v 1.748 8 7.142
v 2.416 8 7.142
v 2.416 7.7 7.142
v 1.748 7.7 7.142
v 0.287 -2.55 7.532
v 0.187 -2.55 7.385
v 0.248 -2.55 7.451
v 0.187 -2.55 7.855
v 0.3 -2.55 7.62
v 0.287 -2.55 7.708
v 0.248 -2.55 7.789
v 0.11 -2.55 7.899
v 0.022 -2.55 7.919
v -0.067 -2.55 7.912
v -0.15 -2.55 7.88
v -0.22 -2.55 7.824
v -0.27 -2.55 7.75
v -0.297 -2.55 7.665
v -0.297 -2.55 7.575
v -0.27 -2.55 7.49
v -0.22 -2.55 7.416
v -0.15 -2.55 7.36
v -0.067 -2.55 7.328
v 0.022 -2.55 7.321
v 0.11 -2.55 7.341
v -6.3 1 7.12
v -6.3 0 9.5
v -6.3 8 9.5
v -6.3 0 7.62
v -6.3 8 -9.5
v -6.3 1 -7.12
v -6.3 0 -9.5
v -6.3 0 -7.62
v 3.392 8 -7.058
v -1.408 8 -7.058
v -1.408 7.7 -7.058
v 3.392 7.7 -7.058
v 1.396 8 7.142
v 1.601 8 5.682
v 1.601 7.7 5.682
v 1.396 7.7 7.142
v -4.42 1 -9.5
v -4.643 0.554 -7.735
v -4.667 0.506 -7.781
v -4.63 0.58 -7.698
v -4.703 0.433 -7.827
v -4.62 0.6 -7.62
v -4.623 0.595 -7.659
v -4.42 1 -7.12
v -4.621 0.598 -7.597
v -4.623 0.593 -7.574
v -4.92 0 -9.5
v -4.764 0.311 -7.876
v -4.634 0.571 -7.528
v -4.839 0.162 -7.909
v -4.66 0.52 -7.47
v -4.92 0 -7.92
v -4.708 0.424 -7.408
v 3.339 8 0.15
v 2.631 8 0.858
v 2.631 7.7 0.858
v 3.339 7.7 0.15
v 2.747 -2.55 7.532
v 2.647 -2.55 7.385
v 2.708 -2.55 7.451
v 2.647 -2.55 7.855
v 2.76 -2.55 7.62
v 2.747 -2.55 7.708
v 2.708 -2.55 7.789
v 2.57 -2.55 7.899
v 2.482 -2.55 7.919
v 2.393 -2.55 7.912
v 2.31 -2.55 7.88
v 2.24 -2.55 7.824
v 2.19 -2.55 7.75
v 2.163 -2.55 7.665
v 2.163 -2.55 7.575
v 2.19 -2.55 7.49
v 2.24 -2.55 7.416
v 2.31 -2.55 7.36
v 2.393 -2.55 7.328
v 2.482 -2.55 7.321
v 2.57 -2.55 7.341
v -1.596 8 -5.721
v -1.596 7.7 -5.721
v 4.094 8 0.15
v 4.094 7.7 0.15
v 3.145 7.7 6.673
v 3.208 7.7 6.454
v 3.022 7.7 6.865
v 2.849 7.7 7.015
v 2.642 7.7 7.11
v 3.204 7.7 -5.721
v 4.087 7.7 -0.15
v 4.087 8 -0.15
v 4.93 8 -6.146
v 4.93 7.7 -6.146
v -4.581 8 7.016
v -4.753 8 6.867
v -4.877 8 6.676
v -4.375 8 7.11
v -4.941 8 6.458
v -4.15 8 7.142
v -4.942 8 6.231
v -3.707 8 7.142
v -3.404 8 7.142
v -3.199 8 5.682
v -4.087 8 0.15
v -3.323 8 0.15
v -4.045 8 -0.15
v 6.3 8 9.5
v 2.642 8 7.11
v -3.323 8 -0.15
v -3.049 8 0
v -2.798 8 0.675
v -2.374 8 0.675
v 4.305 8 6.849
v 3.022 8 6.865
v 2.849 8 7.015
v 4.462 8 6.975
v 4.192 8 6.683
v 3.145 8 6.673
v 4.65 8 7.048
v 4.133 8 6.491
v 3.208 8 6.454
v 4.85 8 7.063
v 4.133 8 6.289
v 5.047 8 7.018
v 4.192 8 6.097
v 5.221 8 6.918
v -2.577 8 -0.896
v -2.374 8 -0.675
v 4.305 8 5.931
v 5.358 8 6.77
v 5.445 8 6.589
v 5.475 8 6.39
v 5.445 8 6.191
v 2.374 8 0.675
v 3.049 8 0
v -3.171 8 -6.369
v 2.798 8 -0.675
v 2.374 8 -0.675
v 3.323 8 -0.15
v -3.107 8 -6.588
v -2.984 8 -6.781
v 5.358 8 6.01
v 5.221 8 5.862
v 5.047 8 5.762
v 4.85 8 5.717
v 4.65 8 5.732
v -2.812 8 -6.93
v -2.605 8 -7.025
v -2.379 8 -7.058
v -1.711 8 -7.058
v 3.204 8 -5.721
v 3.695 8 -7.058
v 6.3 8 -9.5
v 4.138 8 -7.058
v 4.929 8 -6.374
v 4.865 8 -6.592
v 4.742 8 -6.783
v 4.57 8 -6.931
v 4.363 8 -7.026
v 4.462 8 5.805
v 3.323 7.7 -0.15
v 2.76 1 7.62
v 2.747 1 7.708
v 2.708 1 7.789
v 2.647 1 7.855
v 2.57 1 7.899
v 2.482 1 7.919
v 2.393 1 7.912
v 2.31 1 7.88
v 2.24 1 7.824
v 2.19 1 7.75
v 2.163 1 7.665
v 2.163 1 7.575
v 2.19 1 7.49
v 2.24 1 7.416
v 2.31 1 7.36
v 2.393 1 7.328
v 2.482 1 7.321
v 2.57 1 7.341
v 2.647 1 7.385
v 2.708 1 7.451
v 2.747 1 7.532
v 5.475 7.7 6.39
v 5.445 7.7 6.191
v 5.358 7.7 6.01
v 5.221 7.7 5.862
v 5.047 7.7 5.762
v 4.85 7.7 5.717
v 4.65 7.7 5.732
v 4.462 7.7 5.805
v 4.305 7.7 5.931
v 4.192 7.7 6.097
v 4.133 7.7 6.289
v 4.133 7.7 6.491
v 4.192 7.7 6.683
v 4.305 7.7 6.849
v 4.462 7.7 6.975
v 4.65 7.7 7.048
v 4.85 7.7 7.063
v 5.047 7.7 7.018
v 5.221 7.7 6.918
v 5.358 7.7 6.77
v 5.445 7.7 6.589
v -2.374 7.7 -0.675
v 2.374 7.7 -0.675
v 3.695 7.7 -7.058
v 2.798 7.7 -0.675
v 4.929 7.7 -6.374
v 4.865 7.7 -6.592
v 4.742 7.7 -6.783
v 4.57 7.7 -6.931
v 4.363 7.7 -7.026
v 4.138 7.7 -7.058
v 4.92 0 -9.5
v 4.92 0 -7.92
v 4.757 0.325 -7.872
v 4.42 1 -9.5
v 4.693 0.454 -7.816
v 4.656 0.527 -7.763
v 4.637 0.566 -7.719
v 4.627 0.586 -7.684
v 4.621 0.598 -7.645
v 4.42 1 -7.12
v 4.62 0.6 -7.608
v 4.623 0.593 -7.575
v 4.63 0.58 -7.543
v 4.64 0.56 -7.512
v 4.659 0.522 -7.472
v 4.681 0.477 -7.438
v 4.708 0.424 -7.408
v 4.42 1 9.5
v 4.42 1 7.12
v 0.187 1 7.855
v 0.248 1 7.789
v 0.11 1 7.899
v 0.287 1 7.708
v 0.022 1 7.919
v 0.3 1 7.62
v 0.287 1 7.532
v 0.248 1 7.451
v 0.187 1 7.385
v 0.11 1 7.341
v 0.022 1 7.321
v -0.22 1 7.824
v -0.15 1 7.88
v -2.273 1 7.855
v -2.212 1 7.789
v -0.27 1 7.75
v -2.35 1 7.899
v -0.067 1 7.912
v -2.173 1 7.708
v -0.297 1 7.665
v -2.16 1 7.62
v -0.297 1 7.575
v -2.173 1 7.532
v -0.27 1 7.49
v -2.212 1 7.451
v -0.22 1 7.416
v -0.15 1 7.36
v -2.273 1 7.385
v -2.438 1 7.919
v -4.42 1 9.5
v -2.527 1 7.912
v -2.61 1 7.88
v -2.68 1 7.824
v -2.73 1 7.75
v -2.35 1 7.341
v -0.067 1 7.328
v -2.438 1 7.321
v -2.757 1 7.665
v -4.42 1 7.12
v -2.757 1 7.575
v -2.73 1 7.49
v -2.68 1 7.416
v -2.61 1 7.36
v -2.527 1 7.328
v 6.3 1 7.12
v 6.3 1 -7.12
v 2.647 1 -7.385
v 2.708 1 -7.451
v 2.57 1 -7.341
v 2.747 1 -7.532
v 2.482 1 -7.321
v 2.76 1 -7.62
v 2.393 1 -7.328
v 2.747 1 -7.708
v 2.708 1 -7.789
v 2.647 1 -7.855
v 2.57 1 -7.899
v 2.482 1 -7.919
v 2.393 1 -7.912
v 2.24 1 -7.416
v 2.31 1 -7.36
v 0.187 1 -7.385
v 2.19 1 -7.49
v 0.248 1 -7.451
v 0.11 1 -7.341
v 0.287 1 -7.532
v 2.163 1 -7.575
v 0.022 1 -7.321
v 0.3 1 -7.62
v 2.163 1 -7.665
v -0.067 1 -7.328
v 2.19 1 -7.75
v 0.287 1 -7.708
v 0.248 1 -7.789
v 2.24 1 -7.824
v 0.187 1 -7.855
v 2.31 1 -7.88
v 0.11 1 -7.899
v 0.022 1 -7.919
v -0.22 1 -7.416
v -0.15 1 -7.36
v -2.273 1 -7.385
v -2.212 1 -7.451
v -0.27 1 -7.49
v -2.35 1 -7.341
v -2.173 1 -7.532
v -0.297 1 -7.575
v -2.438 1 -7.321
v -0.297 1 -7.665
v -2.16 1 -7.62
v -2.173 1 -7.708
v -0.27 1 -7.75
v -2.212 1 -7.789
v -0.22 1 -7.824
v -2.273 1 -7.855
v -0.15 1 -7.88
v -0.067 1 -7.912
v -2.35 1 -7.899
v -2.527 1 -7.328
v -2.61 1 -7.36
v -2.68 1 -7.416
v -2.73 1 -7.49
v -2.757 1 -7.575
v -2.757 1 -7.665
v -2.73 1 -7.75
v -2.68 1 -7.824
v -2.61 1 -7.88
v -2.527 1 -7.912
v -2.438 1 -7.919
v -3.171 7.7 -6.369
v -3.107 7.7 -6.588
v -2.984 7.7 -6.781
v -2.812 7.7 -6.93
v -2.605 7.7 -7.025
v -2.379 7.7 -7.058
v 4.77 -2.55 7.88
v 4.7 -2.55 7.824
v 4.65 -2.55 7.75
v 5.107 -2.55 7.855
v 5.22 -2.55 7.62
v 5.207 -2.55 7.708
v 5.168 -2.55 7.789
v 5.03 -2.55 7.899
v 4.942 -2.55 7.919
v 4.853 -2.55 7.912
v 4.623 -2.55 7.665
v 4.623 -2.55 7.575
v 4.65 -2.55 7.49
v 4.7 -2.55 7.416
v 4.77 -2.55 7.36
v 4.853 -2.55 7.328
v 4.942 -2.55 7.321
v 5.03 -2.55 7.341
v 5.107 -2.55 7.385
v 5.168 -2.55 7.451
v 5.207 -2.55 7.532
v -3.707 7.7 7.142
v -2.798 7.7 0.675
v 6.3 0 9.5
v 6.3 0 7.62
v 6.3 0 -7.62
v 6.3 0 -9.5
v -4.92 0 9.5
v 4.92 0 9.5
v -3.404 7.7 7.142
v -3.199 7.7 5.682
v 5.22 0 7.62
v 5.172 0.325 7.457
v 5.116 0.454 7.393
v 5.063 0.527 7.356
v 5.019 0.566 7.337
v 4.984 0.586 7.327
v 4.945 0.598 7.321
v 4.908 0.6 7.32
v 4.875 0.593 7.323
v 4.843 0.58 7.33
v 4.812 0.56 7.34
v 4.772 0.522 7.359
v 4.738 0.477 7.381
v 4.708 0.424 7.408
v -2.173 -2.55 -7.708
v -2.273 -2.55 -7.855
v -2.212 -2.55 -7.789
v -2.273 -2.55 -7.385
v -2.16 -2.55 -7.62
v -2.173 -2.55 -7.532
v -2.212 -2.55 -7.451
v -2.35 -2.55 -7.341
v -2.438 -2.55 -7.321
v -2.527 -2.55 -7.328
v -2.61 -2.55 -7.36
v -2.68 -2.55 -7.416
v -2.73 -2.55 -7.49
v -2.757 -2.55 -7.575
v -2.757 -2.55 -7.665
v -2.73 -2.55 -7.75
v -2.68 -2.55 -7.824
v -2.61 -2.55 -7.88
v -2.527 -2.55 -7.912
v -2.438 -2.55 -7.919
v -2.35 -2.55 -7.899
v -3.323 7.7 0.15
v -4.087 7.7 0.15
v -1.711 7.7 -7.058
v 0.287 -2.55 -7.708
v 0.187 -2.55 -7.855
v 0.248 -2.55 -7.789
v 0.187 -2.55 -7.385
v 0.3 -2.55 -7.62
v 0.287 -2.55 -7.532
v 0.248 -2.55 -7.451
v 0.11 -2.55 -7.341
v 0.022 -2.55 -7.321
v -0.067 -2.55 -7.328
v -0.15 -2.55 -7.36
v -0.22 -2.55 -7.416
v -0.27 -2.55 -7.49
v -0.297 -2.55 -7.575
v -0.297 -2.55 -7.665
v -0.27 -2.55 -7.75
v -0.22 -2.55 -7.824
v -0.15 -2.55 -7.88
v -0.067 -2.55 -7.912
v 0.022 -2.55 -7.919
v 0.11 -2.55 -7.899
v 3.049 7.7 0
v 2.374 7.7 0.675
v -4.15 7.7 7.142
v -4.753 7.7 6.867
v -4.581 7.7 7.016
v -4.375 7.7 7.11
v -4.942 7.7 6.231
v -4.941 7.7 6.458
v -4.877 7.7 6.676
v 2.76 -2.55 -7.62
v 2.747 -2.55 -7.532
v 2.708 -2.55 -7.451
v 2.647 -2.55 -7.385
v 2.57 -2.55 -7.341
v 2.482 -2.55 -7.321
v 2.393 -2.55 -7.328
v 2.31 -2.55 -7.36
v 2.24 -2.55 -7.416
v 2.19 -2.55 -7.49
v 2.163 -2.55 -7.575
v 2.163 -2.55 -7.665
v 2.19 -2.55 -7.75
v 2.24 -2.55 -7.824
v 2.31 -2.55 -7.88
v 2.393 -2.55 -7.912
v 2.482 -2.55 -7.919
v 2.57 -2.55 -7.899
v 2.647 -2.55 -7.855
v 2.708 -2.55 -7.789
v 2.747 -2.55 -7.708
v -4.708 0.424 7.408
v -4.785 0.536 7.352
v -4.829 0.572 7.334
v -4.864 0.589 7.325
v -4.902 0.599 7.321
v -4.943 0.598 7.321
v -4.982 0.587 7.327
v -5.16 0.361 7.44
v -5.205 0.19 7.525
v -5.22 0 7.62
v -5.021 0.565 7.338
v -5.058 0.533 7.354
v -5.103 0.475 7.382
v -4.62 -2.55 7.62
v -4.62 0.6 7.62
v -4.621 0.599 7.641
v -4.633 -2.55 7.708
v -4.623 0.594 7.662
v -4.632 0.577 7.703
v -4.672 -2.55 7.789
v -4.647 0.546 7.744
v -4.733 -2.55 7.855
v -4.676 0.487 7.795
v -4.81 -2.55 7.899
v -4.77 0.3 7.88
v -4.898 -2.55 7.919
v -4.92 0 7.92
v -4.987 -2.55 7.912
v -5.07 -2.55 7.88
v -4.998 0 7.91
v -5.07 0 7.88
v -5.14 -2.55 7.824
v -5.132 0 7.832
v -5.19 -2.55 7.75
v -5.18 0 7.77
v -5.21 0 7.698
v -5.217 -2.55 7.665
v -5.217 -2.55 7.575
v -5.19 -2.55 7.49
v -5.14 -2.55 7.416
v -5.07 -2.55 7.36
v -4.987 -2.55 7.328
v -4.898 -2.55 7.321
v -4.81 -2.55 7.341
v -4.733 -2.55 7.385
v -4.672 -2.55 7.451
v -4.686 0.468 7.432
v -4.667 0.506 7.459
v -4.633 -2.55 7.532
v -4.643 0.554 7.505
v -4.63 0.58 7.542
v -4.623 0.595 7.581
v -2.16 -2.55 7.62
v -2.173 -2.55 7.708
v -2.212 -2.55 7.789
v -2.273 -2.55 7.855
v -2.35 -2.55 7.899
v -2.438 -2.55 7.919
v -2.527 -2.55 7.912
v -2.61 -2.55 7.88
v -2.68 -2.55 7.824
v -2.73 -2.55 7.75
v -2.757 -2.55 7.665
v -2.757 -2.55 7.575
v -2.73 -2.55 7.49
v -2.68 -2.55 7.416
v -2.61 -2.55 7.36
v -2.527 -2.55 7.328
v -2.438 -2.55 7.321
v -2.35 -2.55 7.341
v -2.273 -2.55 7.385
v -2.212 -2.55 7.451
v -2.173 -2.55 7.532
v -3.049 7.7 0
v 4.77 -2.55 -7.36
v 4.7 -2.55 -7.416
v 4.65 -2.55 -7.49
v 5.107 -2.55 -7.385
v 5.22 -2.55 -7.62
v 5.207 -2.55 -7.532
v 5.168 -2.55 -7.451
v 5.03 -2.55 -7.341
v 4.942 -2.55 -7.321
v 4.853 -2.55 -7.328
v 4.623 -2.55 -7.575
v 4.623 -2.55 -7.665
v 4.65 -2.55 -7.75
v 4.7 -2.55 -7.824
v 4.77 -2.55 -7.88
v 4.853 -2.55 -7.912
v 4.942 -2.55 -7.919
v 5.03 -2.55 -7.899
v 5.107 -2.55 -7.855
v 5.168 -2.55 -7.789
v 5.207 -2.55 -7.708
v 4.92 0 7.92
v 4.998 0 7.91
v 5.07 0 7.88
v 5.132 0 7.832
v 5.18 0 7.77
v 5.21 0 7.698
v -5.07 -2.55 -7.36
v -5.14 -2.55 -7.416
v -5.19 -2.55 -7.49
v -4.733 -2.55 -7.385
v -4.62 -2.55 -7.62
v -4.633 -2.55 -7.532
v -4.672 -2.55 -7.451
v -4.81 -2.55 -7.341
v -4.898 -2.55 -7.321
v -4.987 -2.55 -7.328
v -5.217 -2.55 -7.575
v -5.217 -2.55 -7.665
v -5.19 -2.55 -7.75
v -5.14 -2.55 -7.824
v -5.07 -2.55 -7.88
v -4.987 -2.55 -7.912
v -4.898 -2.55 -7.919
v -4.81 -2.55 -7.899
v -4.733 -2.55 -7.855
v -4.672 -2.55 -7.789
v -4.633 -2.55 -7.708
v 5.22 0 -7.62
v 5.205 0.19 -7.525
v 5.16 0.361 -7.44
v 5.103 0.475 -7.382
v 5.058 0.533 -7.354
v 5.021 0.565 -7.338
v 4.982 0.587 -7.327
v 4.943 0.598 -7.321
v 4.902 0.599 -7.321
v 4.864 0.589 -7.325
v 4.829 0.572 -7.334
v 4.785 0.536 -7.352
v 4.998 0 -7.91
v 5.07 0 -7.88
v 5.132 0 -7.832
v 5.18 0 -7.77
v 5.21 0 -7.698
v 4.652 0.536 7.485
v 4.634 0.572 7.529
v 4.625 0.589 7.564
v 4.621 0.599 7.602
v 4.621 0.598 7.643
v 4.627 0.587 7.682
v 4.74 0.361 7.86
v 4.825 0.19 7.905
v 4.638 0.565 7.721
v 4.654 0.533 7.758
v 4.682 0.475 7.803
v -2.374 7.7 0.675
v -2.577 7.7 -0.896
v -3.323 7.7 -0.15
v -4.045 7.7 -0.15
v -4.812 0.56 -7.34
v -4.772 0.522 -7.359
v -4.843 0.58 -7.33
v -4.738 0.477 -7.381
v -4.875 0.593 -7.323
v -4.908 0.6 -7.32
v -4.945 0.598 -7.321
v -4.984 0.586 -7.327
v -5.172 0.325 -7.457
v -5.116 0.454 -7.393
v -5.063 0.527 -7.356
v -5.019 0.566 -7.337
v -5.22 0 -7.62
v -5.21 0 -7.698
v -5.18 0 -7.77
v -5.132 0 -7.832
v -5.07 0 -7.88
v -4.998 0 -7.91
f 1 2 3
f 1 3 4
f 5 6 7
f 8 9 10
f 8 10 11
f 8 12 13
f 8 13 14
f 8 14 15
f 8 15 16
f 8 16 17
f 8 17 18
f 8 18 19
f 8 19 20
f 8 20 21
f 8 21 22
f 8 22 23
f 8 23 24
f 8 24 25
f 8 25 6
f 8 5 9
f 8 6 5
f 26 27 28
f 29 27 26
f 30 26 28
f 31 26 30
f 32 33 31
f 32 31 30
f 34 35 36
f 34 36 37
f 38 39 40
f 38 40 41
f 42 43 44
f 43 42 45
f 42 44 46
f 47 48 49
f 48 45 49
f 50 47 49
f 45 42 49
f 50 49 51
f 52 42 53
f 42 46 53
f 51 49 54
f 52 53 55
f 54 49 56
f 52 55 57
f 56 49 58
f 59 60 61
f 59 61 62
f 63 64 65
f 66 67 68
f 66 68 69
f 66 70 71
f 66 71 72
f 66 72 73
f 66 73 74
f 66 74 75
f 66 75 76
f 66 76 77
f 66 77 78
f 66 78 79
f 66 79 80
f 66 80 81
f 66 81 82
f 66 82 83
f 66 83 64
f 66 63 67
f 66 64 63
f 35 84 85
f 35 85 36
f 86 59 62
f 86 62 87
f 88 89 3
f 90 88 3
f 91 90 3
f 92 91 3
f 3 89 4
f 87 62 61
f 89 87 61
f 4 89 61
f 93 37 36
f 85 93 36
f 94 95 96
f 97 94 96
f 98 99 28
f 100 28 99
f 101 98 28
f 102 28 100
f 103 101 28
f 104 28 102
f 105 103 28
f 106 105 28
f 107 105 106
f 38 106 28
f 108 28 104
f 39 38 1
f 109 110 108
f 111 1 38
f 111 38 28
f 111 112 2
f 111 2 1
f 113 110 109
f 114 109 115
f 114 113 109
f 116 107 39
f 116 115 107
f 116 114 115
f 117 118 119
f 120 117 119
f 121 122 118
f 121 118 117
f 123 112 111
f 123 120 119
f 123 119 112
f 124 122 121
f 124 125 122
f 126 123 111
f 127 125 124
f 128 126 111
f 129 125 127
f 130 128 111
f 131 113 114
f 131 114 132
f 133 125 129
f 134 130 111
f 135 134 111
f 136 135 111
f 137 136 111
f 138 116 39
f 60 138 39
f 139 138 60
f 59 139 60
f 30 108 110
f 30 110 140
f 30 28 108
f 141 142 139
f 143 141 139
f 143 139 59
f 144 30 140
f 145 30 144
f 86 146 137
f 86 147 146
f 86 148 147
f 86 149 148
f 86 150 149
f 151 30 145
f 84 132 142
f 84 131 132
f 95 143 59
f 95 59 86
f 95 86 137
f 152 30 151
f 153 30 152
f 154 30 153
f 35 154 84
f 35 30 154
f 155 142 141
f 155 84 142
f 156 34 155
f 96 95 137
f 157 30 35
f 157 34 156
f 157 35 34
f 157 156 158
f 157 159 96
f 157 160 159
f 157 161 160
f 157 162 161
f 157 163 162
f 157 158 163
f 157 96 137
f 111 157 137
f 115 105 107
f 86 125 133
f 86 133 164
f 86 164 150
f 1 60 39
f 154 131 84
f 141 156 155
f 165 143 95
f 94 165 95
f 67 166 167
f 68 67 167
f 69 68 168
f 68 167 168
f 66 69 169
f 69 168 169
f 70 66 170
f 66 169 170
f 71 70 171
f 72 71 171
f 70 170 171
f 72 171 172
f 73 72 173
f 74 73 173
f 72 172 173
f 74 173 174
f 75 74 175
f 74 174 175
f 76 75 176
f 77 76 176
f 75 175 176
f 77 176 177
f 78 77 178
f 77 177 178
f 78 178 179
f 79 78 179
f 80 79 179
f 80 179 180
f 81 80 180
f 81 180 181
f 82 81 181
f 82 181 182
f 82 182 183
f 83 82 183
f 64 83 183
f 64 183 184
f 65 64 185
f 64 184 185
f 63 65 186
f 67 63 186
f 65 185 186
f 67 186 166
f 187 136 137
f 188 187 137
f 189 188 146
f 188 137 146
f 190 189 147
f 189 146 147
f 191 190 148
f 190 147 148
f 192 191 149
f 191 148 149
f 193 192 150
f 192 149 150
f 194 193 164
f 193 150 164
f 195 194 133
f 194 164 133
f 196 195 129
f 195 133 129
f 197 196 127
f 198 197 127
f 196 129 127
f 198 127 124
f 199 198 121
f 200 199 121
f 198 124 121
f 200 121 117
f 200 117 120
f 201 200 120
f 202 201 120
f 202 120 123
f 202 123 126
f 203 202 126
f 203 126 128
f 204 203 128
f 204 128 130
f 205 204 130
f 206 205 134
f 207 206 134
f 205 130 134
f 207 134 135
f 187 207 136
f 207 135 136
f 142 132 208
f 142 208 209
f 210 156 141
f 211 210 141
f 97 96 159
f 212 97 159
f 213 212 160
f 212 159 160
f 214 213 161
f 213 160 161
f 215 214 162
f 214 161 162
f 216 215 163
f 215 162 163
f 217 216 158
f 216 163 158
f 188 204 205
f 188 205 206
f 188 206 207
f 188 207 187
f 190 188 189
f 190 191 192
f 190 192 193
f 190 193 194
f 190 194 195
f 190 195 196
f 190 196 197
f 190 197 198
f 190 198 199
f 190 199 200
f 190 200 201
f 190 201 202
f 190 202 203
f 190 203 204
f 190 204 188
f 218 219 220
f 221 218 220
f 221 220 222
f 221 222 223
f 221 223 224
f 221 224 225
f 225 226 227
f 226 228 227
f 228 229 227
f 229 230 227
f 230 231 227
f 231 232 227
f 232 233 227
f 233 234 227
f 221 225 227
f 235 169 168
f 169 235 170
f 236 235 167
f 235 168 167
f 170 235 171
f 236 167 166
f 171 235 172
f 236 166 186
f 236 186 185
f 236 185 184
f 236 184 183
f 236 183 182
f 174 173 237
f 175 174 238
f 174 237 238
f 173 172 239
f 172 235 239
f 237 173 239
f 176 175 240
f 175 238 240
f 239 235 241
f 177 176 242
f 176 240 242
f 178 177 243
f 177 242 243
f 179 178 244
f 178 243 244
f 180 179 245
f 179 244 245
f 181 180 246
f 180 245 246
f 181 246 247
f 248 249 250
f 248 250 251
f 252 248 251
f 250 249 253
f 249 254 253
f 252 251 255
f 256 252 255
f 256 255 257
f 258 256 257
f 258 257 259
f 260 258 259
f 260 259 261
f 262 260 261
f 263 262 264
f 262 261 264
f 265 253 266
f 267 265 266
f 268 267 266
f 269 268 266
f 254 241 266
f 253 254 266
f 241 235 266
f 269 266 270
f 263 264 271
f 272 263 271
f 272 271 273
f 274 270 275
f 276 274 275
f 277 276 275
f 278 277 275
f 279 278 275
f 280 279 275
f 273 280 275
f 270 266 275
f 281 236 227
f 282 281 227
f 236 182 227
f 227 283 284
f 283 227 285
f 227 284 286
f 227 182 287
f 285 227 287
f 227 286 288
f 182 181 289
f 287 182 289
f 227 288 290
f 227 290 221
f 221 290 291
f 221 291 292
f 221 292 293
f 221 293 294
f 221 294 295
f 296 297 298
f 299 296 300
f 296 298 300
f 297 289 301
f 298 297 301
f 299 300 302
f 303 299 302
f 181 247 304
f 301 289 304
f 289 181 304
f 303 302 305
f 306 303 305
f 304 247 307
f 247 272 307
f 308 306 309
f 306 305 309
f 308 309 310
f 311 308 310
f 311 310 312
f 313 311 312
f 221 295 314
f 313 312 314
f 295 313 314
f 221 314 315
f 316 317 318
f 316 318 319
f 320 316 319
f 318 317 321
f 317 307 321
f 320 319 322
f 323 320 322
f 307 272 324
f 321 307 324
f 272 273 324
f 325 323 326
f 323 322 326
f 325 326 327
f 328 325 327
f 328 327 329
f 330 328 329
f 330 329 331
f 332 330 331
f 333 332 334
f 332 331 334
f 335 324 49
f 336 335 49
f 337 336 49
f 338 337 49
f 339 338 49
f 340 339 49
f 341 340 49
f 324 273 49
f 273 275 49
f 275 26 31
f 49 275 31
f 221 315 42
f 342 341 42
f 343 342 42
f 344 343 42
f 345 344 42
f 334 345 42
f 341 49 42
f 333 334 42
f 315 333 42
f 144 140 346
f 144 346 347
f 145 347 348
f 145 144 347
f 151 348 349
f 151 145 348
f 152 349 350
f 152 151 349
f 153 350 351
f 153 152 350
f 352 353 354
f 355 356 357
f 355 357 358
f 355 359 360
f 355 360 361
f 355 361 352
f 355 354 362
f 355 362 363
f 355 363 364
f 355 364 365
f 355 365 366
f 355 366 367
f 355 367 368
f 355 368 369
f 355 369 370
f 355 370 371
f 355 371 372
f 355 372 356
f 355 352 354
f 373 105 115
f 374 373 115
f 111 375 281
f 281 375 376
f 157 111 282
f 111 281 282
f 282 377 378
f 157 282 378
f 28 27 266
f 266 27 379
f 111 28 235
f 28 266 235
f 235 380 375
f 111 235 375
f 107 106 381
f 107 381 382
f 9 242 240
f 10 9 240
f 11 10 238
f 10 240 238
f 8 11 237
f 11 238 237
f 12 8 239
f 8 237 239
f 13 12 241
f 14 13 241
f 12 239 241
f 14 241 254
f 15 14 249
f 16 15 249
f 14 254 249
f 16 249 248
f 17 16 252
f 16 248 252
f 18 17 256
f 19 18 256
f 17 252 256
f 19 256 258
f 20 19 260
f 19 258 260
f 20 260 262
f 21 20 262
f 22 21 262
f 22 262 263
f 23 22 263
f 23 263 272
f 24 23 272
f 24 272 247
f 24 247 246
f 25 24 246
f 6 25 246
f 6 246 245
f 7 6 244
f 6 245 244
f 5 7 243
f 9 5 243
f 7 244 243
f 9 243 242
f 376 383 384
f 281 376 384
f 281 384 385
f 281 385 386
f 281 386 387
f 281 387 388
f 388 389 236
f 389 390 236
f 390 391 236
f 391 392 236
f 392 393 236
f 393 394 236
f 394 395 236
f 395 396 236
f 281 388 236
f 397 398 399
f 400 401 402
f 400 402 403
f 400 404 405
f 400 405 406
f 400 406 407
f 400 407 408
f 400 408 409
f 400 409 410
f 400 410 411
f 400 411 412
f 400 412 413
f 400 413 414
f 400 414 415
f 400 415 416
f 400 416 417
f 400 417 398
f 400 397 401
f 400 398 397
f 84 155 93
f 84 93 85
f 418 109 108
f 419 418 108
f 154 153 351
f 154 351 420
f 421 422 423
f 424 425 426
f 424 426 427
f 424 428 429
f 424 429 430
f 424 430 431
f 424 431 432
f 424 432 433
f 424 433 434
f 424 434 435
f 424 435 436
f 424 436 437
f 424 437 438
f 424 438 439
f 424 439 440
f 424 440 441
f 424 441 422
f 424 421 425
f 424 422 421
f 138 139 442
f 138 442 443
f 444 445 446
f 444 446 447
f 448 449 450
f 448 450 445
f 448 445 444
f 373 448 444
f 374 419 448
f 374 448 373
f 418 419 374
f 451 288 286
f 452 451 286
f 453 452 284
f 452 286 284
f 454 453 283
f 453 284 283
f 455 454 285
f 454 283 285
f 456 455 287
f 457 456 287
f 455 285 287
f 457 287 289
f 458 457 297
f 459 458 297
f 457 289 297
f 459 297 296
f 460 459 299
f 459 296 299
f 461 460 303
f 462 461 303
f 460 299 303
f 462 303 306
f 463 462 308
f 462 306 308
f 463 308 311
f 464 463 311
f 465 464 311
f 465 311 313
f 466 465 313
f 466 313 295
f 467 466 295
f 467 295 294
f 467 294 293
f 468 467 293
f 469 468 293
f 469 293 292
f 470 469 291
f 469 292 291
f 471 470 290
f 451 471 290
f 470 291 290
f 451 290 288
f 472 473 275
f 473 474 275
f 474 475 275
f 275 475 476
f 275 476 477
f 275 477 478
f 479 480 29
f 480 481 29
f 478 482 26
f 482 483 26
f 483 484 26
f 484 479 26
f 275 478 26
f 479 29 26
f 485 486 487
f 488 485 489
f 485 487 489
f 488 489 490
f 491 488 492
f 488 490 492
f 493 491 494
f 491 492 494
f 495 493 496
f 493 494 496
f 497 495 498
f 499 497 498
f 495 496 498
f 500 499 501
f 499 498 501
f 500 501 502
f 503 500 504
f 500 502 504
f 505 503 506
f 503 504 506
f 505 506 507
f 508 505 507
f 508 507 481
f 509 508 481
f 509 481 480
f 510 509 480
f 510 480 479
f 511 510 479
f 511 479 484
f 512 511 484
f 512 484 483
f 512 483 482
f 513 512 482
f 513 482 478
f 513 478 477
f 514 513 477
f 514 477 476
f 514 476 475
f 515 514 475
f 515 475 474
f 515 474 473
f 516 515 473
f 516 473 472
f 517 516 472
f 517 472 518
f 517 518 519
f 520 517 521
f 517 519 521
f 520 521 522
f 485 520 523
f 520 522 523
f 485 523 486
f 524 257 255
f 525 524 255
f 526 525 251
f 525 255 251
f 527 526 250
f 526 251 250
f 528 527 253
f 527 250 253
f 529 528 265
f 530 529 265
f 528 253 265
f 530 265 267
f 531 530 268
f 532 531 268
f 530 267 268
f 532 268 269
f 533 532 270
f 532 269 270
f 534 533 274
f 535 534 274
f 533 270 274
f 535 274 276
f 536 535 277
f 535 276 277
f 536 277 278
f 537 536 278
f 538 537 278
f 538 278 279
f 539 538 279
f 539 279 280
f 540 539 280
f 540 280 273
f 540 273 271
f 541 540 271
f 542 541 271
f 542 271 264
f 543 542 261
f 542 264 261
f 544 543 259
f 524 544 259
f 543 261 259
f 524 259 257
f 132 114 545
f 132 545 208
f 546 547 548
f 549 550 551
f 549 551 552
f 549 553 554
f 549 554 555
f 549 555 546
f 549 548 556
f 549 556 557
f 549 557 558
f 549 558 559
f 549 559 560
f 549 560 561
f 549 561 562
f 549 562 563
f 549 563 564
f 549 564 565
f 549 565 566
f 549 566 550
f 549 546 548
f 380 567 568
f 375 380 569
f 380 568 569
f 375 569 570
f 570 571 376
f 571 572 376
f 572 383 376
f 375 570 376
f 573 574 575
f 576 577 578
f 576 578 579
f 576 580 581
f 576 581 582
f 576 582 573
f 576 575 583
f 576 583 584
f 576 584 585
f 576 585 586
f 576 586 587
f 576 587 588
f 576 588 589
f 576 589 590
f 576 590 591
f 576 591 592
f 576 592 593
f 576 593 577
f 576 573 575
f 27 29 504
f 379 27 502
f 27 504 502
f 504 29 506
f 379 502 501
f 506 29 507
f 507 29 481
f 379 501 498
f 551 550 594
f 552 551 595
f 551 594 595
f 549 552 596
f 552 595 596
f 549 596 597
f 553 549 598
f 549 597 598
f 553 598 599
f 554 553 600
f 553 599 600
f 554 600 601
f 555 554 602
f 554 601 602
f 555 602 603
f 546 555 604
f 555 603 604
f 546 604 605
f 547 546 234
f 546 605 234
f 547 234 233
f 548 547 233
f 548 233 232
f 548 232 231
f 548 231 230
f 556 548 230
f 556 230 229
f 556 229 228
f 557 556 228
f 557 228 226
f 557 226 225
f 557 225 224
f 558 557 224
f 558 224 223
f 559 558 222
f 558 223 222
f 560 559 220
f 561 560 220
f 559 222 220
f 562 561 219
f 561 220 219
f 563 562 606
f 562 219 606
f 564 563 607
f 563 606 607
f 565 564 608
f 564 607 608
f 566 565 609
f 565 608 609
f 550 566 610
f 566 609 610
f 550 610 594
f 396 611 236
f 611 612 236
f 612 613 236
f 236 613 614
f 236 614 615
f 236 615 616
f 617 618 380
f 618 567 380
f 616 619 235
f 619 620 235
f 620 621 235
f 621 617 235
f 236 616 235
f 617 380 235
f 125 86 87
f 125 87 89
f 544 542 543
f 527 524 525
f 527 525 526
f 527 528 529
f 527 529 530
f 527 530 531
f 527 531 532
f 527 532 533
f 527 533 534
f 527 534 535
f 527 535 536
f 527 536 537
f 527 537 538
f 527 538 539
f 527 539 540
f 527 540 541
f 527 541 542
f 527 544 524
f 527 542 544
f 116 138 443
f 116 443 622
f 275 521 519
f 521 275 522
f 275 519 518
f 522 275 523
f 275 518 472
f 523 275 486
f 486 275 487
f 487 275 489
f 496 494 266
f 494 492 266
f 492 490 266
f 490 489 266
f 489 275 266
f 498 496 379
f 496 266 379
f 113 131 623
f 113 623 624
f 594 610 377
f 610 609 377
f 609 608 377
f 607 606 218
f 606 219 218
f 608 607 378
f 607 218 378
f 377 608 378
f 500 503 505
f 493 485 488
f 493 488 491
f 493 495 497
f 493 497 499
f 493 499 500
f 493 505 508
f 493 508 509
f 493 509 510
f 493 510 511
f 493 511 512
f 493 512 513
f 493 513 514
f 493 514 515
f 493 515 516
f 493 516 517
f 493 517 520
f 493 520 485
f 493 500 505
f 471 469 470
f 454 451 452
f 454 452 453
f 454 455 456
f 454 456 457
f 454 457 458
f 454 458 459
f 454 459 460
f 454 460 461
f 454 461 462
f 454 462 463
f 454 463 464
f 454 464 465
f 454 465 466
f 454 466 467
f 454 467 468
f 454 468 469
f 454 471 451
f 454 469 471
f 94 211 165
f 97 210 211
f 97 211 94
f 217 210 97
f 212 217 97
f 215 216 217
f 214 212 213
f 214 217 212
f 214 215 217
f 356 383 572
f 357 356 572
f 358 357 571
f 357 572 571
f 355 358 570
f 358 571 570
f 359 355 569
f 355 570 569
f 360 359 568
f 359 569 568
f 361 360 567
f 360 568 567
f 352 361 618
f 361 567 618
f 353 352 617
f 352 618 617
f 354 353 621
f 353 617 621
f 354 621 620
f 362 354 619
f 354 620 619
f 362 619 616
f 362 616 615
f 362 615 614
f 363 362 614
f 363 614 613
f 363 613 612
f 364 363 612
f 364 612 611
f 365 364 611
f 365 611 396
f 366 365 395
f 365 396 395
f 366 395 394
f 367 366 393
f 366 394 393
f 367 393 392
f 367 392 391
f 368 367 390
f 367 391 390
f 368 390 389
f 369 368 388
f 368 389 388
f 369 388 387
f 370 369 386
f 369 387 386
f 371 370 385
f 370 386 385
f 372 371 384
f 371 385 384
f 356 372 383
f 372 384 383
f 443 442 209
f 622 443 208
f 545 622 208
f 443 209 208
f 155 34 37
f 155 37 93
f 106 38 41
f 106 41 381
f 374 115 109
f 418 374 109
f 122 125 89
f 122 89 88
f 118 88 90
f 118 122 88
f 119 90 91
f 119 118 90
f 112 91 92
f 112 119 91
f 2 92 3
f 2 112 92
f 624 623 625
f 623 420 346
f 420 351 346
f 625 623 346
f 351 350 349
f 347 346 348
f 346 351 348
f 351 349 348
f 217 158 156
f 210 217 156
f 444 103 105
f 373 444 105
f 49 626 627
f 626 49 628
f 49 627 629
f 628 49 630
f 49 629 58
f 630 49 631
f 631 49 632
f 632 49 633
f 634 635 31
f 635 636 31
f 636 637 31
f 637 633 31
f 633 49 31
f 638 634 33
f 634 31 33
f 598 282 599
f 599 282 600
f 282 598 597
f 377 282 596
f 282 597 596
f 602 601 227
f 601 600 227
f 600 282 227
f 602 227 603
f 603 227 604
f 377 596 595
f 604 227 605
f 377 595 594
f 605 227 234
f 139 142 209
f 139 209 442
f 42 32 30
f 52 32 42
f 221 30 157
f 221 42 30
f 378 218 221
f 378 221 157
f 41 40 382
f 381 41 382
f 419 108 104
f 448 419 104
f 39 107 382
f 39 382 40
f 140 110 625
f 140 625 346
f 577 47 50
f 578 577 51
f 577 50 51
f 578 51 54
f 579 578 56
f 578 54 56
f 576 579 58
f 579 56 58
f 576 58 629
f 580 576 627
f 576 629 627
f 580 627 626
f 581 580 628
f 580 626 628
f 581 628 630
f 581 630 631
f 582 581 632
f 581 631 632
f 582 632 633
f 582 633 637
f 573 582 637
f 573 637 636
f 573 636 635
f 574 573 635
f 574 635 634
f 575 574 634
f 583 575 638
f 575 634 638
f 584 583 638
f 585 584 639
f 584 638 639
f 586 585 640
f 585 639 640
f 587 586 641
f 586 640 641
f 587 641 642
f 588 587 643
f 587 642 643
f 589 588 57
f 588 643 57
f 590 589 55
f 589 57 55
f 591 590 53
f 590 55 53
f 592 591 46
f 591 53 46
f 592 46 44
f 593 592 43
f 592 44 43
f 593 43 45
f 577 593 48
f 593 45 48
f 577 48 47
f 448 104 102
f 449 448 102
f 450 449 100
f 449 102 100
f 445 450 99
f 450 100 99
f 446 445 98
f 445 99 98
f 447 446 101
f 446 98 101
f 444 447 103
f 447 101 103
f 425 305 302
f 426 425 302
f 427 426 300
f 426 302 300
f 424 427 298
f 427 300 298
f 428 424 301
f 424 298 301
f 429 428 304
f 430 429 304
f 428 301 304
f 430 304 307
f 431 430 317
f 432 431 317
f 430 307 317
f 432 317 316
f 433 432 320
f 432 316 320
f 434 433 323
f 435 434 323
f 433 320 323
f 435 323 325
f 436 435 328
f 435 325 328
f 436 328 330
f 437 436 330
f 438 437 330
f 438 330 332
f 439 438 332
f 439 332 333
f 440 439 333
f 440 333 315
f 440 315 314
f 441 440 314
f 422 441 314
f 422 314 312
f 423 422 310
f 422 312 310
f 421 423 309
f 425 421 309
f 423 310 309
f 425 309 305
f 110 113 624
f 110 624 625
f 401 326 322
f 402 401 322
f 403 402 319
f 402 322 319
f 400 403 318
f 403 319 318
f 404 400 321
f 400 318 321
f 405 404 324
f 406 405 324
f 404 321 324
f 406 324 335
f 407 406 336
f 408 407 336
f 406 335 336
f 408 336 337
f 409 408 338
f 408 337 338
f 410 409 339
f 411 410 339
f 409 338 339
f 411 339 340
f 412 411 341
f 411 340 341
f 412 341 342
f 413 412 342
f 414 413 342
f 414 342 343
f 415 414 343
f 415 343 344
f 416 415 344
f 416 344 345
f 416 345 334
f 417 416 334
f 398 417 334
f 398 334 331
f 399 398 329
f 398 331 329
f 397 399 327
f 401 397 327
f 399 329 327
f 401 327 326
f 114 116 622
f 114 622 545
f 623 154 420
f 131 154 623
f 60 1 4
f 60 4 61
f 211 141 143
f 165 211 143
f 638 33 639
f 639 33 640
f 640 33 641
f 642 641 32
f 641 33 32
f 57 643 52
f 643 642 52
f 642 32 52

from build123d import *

# Parameters (mm, degrees)
SKETCH1_W           = 12.6
SKETCH1_H           = 19
BOSS_EXTRUDE1_DEPTH = 8
CUT_EXTRUDE1_DEPTH  = 20
CUT_EXTRUDE2_DEPTH  = 13.6
SKETCH4_R           = 0.675
CUT_EXTRUDE3_DEPTH  = 0.3
SKETCH5_R           = 0.3
BOSS_EXTRUDE2_DEPTH = 3.55


with BuildPart() as part:
    # Sketch1 → Boss-Extrude1 (new body)
    with BuildSketch(Plane(origin=(0, 0, 0), x_dir=(1, 0, 0), z_dir=(0, 1, 0))):
        Rectangle(SKETCH1_W, SKETCH1_H)
    extrude(amount=BOSS_EXTRUDE1_DEPTH)

    # Sketch2 → Cut-Extrude1 (cut, through all)
    with BuildSketch(Plane.XY.offset(9.5)):
        Polygon((-4.92, 0), (4.92, 0), (4.42, 1), (-4.42, 1), align=None)
    extrude(amount=-CUT_EXTRUDE1_DEPTH, mode=Mode.SUBTRACT)

    # Sketch3 → Cut-Extrude2 (cut, through all)
    with BuildSketch(Plane.ZY.offset(6.3)):
        Polygon((-7.62, 0), (7.62, 0), (7.12, 1), (-7.12, 1), align=None)
    extrude(amount=-CUT_EXTRUDE2_DEPTH, mode=Mode.SUBTRACT)

    # Sketch4 → Cut-Extrude3 (cut)
    with BuildSketch(Plane(origin=(0, 8, 0), x_dir=(1, 0, 0), z_dir=(0, 1, 0))):
        with Locations((4.8, -6.39)):
            Circle(SKETCH4_R)
        Polygon((-1.408090595, 7.057802146), (3.391909405, 7.057802146), (3.204025719, 5.720940254), (-1.595974281, 5.720940254), align=None)
        Polygon((-3.198514004, -5.681722368), (1.601485996, -5.681722368), (1.396229552, -7.142197854), (-3.403770448, -7.142197854), align=None)
        Polygon((-3.048549266, 0), (-2.373549266, 0.675), (2.373549266, 0.675), (3.048549266, 0), (2.373549266, -0.675), (-2.373549266, -0.675), align=None)
        with BuildLine():
            Line((3.694857677, 7.057802146), (2.797813335, 0.675))
            Line((2.797813335, 0.675), (3.322813335, 0.15))
            Line((3.322813335, 0.15), (4.08729662, 0.15))
            Line((4.08729662, 0.15), (4.930044629, 6.146463666))
            ThreePointArc((4.930044629, 6.146463666), (4.741597838, 6.78264937), (4.137830174, 7.057802146))
            Line((4.137830174, 7.057802146), (3.694857677, 7.057802146))
        make_face()
        with BuildLine():
            Line((3.339208356, -0.15), (4.094226883, -0.15))
            Line((4.094226883, -0.15), (3.208322625, -6.453536334))
            ThreePointArc((3.208322625, -6.453536334), (2.940955393, -6.945965518), (2.41610817, -7.142197854))
            Line((2.41610817, -7.142197854), (1.748270337, -7.142197854))
            Line((1.748270337, -7.142197854), (2.631497367, -0.857710989))
            Line((2.631497367, -0.857710989), (3.339208356, -0.15))
        make_face()
        with BuildLine():
            Line((-1.711038867, 7.057802146), (-2.577058081, 0.895755255))
            Line((-2.577058081, 0.895755255), (-3.322813335, 0.15))
            Line((-3.322813335, 0.15), (-4.045134369, 0.15))
            Line((-4.045134369, 0.15), (-3.171091155, 6.369140627))
            ThreePointArc((-3.171091155, 6.369140627), (-2.903723923, 6.861569811), (-2.3788767, 7.057802146))
            Line((-2.3788767, 7.057802146), (-1.711038867, 7.057802146))
        make_face()
        with BuildLine():
            Line((-4.08729662, -0.15), (-4.941905672, -6.230859373))
            ThreePointArc((-4.941905672, -6.230859373), (-4.753458881, -6.867045077), (-4.149691217, -7.142197854))
            Line((-4.149691217, -7.142197854), (-3.70671872, -7.142197854))
            Line((-3.70671872, -7.142197854), (-2.797813335, -0.675))
            Line((-2.797813335, -0.675), (-3.322813335, -0.15))
            Line((-3.322813335, -0.15), (-4.08729662, -0.15))
        make_face()
    extrude(amount=-CUT_EXTRUDE3_DEPTH, mode=Mode.SUBTRACT)

    # Sketch5 → Boss-Extrude2 (add)
    with BuildSketch(Plane.XZ.offset(-1)):
        with Locations((-4.92, 7.62)):
            Circle(SKETCH5_R)
        with Locations((-2.46, 7.62)):
            Circle(SKETCH5_R)
        with Locations((0, 7.62)):
            Circle(SKETCH5_R)
        with Locations((2.46, 7.62)):
            Circle(SKETCH5_R)
        with Locations((4.92, 7.62)):
            Circle(SKETCH5_R)
        with Locations((-2.46, -7.62)):
            Circle(SKETCH5_R)
        with Locations((0, -7.62)):
            Circle(SKETCH5_R)
        with Locations((2.46, -7.62)):
            Circle(SKETCH5_R)
        with Locations((4.92, -7.62)):
            Circle(SKETCH5_R)
        with Locations((-4.92, -7.62)):
            Circle(SKETCH5_R)
    extrude(amount=BOSS_EXTRUDE2_DEPTH)


solid = part.part
